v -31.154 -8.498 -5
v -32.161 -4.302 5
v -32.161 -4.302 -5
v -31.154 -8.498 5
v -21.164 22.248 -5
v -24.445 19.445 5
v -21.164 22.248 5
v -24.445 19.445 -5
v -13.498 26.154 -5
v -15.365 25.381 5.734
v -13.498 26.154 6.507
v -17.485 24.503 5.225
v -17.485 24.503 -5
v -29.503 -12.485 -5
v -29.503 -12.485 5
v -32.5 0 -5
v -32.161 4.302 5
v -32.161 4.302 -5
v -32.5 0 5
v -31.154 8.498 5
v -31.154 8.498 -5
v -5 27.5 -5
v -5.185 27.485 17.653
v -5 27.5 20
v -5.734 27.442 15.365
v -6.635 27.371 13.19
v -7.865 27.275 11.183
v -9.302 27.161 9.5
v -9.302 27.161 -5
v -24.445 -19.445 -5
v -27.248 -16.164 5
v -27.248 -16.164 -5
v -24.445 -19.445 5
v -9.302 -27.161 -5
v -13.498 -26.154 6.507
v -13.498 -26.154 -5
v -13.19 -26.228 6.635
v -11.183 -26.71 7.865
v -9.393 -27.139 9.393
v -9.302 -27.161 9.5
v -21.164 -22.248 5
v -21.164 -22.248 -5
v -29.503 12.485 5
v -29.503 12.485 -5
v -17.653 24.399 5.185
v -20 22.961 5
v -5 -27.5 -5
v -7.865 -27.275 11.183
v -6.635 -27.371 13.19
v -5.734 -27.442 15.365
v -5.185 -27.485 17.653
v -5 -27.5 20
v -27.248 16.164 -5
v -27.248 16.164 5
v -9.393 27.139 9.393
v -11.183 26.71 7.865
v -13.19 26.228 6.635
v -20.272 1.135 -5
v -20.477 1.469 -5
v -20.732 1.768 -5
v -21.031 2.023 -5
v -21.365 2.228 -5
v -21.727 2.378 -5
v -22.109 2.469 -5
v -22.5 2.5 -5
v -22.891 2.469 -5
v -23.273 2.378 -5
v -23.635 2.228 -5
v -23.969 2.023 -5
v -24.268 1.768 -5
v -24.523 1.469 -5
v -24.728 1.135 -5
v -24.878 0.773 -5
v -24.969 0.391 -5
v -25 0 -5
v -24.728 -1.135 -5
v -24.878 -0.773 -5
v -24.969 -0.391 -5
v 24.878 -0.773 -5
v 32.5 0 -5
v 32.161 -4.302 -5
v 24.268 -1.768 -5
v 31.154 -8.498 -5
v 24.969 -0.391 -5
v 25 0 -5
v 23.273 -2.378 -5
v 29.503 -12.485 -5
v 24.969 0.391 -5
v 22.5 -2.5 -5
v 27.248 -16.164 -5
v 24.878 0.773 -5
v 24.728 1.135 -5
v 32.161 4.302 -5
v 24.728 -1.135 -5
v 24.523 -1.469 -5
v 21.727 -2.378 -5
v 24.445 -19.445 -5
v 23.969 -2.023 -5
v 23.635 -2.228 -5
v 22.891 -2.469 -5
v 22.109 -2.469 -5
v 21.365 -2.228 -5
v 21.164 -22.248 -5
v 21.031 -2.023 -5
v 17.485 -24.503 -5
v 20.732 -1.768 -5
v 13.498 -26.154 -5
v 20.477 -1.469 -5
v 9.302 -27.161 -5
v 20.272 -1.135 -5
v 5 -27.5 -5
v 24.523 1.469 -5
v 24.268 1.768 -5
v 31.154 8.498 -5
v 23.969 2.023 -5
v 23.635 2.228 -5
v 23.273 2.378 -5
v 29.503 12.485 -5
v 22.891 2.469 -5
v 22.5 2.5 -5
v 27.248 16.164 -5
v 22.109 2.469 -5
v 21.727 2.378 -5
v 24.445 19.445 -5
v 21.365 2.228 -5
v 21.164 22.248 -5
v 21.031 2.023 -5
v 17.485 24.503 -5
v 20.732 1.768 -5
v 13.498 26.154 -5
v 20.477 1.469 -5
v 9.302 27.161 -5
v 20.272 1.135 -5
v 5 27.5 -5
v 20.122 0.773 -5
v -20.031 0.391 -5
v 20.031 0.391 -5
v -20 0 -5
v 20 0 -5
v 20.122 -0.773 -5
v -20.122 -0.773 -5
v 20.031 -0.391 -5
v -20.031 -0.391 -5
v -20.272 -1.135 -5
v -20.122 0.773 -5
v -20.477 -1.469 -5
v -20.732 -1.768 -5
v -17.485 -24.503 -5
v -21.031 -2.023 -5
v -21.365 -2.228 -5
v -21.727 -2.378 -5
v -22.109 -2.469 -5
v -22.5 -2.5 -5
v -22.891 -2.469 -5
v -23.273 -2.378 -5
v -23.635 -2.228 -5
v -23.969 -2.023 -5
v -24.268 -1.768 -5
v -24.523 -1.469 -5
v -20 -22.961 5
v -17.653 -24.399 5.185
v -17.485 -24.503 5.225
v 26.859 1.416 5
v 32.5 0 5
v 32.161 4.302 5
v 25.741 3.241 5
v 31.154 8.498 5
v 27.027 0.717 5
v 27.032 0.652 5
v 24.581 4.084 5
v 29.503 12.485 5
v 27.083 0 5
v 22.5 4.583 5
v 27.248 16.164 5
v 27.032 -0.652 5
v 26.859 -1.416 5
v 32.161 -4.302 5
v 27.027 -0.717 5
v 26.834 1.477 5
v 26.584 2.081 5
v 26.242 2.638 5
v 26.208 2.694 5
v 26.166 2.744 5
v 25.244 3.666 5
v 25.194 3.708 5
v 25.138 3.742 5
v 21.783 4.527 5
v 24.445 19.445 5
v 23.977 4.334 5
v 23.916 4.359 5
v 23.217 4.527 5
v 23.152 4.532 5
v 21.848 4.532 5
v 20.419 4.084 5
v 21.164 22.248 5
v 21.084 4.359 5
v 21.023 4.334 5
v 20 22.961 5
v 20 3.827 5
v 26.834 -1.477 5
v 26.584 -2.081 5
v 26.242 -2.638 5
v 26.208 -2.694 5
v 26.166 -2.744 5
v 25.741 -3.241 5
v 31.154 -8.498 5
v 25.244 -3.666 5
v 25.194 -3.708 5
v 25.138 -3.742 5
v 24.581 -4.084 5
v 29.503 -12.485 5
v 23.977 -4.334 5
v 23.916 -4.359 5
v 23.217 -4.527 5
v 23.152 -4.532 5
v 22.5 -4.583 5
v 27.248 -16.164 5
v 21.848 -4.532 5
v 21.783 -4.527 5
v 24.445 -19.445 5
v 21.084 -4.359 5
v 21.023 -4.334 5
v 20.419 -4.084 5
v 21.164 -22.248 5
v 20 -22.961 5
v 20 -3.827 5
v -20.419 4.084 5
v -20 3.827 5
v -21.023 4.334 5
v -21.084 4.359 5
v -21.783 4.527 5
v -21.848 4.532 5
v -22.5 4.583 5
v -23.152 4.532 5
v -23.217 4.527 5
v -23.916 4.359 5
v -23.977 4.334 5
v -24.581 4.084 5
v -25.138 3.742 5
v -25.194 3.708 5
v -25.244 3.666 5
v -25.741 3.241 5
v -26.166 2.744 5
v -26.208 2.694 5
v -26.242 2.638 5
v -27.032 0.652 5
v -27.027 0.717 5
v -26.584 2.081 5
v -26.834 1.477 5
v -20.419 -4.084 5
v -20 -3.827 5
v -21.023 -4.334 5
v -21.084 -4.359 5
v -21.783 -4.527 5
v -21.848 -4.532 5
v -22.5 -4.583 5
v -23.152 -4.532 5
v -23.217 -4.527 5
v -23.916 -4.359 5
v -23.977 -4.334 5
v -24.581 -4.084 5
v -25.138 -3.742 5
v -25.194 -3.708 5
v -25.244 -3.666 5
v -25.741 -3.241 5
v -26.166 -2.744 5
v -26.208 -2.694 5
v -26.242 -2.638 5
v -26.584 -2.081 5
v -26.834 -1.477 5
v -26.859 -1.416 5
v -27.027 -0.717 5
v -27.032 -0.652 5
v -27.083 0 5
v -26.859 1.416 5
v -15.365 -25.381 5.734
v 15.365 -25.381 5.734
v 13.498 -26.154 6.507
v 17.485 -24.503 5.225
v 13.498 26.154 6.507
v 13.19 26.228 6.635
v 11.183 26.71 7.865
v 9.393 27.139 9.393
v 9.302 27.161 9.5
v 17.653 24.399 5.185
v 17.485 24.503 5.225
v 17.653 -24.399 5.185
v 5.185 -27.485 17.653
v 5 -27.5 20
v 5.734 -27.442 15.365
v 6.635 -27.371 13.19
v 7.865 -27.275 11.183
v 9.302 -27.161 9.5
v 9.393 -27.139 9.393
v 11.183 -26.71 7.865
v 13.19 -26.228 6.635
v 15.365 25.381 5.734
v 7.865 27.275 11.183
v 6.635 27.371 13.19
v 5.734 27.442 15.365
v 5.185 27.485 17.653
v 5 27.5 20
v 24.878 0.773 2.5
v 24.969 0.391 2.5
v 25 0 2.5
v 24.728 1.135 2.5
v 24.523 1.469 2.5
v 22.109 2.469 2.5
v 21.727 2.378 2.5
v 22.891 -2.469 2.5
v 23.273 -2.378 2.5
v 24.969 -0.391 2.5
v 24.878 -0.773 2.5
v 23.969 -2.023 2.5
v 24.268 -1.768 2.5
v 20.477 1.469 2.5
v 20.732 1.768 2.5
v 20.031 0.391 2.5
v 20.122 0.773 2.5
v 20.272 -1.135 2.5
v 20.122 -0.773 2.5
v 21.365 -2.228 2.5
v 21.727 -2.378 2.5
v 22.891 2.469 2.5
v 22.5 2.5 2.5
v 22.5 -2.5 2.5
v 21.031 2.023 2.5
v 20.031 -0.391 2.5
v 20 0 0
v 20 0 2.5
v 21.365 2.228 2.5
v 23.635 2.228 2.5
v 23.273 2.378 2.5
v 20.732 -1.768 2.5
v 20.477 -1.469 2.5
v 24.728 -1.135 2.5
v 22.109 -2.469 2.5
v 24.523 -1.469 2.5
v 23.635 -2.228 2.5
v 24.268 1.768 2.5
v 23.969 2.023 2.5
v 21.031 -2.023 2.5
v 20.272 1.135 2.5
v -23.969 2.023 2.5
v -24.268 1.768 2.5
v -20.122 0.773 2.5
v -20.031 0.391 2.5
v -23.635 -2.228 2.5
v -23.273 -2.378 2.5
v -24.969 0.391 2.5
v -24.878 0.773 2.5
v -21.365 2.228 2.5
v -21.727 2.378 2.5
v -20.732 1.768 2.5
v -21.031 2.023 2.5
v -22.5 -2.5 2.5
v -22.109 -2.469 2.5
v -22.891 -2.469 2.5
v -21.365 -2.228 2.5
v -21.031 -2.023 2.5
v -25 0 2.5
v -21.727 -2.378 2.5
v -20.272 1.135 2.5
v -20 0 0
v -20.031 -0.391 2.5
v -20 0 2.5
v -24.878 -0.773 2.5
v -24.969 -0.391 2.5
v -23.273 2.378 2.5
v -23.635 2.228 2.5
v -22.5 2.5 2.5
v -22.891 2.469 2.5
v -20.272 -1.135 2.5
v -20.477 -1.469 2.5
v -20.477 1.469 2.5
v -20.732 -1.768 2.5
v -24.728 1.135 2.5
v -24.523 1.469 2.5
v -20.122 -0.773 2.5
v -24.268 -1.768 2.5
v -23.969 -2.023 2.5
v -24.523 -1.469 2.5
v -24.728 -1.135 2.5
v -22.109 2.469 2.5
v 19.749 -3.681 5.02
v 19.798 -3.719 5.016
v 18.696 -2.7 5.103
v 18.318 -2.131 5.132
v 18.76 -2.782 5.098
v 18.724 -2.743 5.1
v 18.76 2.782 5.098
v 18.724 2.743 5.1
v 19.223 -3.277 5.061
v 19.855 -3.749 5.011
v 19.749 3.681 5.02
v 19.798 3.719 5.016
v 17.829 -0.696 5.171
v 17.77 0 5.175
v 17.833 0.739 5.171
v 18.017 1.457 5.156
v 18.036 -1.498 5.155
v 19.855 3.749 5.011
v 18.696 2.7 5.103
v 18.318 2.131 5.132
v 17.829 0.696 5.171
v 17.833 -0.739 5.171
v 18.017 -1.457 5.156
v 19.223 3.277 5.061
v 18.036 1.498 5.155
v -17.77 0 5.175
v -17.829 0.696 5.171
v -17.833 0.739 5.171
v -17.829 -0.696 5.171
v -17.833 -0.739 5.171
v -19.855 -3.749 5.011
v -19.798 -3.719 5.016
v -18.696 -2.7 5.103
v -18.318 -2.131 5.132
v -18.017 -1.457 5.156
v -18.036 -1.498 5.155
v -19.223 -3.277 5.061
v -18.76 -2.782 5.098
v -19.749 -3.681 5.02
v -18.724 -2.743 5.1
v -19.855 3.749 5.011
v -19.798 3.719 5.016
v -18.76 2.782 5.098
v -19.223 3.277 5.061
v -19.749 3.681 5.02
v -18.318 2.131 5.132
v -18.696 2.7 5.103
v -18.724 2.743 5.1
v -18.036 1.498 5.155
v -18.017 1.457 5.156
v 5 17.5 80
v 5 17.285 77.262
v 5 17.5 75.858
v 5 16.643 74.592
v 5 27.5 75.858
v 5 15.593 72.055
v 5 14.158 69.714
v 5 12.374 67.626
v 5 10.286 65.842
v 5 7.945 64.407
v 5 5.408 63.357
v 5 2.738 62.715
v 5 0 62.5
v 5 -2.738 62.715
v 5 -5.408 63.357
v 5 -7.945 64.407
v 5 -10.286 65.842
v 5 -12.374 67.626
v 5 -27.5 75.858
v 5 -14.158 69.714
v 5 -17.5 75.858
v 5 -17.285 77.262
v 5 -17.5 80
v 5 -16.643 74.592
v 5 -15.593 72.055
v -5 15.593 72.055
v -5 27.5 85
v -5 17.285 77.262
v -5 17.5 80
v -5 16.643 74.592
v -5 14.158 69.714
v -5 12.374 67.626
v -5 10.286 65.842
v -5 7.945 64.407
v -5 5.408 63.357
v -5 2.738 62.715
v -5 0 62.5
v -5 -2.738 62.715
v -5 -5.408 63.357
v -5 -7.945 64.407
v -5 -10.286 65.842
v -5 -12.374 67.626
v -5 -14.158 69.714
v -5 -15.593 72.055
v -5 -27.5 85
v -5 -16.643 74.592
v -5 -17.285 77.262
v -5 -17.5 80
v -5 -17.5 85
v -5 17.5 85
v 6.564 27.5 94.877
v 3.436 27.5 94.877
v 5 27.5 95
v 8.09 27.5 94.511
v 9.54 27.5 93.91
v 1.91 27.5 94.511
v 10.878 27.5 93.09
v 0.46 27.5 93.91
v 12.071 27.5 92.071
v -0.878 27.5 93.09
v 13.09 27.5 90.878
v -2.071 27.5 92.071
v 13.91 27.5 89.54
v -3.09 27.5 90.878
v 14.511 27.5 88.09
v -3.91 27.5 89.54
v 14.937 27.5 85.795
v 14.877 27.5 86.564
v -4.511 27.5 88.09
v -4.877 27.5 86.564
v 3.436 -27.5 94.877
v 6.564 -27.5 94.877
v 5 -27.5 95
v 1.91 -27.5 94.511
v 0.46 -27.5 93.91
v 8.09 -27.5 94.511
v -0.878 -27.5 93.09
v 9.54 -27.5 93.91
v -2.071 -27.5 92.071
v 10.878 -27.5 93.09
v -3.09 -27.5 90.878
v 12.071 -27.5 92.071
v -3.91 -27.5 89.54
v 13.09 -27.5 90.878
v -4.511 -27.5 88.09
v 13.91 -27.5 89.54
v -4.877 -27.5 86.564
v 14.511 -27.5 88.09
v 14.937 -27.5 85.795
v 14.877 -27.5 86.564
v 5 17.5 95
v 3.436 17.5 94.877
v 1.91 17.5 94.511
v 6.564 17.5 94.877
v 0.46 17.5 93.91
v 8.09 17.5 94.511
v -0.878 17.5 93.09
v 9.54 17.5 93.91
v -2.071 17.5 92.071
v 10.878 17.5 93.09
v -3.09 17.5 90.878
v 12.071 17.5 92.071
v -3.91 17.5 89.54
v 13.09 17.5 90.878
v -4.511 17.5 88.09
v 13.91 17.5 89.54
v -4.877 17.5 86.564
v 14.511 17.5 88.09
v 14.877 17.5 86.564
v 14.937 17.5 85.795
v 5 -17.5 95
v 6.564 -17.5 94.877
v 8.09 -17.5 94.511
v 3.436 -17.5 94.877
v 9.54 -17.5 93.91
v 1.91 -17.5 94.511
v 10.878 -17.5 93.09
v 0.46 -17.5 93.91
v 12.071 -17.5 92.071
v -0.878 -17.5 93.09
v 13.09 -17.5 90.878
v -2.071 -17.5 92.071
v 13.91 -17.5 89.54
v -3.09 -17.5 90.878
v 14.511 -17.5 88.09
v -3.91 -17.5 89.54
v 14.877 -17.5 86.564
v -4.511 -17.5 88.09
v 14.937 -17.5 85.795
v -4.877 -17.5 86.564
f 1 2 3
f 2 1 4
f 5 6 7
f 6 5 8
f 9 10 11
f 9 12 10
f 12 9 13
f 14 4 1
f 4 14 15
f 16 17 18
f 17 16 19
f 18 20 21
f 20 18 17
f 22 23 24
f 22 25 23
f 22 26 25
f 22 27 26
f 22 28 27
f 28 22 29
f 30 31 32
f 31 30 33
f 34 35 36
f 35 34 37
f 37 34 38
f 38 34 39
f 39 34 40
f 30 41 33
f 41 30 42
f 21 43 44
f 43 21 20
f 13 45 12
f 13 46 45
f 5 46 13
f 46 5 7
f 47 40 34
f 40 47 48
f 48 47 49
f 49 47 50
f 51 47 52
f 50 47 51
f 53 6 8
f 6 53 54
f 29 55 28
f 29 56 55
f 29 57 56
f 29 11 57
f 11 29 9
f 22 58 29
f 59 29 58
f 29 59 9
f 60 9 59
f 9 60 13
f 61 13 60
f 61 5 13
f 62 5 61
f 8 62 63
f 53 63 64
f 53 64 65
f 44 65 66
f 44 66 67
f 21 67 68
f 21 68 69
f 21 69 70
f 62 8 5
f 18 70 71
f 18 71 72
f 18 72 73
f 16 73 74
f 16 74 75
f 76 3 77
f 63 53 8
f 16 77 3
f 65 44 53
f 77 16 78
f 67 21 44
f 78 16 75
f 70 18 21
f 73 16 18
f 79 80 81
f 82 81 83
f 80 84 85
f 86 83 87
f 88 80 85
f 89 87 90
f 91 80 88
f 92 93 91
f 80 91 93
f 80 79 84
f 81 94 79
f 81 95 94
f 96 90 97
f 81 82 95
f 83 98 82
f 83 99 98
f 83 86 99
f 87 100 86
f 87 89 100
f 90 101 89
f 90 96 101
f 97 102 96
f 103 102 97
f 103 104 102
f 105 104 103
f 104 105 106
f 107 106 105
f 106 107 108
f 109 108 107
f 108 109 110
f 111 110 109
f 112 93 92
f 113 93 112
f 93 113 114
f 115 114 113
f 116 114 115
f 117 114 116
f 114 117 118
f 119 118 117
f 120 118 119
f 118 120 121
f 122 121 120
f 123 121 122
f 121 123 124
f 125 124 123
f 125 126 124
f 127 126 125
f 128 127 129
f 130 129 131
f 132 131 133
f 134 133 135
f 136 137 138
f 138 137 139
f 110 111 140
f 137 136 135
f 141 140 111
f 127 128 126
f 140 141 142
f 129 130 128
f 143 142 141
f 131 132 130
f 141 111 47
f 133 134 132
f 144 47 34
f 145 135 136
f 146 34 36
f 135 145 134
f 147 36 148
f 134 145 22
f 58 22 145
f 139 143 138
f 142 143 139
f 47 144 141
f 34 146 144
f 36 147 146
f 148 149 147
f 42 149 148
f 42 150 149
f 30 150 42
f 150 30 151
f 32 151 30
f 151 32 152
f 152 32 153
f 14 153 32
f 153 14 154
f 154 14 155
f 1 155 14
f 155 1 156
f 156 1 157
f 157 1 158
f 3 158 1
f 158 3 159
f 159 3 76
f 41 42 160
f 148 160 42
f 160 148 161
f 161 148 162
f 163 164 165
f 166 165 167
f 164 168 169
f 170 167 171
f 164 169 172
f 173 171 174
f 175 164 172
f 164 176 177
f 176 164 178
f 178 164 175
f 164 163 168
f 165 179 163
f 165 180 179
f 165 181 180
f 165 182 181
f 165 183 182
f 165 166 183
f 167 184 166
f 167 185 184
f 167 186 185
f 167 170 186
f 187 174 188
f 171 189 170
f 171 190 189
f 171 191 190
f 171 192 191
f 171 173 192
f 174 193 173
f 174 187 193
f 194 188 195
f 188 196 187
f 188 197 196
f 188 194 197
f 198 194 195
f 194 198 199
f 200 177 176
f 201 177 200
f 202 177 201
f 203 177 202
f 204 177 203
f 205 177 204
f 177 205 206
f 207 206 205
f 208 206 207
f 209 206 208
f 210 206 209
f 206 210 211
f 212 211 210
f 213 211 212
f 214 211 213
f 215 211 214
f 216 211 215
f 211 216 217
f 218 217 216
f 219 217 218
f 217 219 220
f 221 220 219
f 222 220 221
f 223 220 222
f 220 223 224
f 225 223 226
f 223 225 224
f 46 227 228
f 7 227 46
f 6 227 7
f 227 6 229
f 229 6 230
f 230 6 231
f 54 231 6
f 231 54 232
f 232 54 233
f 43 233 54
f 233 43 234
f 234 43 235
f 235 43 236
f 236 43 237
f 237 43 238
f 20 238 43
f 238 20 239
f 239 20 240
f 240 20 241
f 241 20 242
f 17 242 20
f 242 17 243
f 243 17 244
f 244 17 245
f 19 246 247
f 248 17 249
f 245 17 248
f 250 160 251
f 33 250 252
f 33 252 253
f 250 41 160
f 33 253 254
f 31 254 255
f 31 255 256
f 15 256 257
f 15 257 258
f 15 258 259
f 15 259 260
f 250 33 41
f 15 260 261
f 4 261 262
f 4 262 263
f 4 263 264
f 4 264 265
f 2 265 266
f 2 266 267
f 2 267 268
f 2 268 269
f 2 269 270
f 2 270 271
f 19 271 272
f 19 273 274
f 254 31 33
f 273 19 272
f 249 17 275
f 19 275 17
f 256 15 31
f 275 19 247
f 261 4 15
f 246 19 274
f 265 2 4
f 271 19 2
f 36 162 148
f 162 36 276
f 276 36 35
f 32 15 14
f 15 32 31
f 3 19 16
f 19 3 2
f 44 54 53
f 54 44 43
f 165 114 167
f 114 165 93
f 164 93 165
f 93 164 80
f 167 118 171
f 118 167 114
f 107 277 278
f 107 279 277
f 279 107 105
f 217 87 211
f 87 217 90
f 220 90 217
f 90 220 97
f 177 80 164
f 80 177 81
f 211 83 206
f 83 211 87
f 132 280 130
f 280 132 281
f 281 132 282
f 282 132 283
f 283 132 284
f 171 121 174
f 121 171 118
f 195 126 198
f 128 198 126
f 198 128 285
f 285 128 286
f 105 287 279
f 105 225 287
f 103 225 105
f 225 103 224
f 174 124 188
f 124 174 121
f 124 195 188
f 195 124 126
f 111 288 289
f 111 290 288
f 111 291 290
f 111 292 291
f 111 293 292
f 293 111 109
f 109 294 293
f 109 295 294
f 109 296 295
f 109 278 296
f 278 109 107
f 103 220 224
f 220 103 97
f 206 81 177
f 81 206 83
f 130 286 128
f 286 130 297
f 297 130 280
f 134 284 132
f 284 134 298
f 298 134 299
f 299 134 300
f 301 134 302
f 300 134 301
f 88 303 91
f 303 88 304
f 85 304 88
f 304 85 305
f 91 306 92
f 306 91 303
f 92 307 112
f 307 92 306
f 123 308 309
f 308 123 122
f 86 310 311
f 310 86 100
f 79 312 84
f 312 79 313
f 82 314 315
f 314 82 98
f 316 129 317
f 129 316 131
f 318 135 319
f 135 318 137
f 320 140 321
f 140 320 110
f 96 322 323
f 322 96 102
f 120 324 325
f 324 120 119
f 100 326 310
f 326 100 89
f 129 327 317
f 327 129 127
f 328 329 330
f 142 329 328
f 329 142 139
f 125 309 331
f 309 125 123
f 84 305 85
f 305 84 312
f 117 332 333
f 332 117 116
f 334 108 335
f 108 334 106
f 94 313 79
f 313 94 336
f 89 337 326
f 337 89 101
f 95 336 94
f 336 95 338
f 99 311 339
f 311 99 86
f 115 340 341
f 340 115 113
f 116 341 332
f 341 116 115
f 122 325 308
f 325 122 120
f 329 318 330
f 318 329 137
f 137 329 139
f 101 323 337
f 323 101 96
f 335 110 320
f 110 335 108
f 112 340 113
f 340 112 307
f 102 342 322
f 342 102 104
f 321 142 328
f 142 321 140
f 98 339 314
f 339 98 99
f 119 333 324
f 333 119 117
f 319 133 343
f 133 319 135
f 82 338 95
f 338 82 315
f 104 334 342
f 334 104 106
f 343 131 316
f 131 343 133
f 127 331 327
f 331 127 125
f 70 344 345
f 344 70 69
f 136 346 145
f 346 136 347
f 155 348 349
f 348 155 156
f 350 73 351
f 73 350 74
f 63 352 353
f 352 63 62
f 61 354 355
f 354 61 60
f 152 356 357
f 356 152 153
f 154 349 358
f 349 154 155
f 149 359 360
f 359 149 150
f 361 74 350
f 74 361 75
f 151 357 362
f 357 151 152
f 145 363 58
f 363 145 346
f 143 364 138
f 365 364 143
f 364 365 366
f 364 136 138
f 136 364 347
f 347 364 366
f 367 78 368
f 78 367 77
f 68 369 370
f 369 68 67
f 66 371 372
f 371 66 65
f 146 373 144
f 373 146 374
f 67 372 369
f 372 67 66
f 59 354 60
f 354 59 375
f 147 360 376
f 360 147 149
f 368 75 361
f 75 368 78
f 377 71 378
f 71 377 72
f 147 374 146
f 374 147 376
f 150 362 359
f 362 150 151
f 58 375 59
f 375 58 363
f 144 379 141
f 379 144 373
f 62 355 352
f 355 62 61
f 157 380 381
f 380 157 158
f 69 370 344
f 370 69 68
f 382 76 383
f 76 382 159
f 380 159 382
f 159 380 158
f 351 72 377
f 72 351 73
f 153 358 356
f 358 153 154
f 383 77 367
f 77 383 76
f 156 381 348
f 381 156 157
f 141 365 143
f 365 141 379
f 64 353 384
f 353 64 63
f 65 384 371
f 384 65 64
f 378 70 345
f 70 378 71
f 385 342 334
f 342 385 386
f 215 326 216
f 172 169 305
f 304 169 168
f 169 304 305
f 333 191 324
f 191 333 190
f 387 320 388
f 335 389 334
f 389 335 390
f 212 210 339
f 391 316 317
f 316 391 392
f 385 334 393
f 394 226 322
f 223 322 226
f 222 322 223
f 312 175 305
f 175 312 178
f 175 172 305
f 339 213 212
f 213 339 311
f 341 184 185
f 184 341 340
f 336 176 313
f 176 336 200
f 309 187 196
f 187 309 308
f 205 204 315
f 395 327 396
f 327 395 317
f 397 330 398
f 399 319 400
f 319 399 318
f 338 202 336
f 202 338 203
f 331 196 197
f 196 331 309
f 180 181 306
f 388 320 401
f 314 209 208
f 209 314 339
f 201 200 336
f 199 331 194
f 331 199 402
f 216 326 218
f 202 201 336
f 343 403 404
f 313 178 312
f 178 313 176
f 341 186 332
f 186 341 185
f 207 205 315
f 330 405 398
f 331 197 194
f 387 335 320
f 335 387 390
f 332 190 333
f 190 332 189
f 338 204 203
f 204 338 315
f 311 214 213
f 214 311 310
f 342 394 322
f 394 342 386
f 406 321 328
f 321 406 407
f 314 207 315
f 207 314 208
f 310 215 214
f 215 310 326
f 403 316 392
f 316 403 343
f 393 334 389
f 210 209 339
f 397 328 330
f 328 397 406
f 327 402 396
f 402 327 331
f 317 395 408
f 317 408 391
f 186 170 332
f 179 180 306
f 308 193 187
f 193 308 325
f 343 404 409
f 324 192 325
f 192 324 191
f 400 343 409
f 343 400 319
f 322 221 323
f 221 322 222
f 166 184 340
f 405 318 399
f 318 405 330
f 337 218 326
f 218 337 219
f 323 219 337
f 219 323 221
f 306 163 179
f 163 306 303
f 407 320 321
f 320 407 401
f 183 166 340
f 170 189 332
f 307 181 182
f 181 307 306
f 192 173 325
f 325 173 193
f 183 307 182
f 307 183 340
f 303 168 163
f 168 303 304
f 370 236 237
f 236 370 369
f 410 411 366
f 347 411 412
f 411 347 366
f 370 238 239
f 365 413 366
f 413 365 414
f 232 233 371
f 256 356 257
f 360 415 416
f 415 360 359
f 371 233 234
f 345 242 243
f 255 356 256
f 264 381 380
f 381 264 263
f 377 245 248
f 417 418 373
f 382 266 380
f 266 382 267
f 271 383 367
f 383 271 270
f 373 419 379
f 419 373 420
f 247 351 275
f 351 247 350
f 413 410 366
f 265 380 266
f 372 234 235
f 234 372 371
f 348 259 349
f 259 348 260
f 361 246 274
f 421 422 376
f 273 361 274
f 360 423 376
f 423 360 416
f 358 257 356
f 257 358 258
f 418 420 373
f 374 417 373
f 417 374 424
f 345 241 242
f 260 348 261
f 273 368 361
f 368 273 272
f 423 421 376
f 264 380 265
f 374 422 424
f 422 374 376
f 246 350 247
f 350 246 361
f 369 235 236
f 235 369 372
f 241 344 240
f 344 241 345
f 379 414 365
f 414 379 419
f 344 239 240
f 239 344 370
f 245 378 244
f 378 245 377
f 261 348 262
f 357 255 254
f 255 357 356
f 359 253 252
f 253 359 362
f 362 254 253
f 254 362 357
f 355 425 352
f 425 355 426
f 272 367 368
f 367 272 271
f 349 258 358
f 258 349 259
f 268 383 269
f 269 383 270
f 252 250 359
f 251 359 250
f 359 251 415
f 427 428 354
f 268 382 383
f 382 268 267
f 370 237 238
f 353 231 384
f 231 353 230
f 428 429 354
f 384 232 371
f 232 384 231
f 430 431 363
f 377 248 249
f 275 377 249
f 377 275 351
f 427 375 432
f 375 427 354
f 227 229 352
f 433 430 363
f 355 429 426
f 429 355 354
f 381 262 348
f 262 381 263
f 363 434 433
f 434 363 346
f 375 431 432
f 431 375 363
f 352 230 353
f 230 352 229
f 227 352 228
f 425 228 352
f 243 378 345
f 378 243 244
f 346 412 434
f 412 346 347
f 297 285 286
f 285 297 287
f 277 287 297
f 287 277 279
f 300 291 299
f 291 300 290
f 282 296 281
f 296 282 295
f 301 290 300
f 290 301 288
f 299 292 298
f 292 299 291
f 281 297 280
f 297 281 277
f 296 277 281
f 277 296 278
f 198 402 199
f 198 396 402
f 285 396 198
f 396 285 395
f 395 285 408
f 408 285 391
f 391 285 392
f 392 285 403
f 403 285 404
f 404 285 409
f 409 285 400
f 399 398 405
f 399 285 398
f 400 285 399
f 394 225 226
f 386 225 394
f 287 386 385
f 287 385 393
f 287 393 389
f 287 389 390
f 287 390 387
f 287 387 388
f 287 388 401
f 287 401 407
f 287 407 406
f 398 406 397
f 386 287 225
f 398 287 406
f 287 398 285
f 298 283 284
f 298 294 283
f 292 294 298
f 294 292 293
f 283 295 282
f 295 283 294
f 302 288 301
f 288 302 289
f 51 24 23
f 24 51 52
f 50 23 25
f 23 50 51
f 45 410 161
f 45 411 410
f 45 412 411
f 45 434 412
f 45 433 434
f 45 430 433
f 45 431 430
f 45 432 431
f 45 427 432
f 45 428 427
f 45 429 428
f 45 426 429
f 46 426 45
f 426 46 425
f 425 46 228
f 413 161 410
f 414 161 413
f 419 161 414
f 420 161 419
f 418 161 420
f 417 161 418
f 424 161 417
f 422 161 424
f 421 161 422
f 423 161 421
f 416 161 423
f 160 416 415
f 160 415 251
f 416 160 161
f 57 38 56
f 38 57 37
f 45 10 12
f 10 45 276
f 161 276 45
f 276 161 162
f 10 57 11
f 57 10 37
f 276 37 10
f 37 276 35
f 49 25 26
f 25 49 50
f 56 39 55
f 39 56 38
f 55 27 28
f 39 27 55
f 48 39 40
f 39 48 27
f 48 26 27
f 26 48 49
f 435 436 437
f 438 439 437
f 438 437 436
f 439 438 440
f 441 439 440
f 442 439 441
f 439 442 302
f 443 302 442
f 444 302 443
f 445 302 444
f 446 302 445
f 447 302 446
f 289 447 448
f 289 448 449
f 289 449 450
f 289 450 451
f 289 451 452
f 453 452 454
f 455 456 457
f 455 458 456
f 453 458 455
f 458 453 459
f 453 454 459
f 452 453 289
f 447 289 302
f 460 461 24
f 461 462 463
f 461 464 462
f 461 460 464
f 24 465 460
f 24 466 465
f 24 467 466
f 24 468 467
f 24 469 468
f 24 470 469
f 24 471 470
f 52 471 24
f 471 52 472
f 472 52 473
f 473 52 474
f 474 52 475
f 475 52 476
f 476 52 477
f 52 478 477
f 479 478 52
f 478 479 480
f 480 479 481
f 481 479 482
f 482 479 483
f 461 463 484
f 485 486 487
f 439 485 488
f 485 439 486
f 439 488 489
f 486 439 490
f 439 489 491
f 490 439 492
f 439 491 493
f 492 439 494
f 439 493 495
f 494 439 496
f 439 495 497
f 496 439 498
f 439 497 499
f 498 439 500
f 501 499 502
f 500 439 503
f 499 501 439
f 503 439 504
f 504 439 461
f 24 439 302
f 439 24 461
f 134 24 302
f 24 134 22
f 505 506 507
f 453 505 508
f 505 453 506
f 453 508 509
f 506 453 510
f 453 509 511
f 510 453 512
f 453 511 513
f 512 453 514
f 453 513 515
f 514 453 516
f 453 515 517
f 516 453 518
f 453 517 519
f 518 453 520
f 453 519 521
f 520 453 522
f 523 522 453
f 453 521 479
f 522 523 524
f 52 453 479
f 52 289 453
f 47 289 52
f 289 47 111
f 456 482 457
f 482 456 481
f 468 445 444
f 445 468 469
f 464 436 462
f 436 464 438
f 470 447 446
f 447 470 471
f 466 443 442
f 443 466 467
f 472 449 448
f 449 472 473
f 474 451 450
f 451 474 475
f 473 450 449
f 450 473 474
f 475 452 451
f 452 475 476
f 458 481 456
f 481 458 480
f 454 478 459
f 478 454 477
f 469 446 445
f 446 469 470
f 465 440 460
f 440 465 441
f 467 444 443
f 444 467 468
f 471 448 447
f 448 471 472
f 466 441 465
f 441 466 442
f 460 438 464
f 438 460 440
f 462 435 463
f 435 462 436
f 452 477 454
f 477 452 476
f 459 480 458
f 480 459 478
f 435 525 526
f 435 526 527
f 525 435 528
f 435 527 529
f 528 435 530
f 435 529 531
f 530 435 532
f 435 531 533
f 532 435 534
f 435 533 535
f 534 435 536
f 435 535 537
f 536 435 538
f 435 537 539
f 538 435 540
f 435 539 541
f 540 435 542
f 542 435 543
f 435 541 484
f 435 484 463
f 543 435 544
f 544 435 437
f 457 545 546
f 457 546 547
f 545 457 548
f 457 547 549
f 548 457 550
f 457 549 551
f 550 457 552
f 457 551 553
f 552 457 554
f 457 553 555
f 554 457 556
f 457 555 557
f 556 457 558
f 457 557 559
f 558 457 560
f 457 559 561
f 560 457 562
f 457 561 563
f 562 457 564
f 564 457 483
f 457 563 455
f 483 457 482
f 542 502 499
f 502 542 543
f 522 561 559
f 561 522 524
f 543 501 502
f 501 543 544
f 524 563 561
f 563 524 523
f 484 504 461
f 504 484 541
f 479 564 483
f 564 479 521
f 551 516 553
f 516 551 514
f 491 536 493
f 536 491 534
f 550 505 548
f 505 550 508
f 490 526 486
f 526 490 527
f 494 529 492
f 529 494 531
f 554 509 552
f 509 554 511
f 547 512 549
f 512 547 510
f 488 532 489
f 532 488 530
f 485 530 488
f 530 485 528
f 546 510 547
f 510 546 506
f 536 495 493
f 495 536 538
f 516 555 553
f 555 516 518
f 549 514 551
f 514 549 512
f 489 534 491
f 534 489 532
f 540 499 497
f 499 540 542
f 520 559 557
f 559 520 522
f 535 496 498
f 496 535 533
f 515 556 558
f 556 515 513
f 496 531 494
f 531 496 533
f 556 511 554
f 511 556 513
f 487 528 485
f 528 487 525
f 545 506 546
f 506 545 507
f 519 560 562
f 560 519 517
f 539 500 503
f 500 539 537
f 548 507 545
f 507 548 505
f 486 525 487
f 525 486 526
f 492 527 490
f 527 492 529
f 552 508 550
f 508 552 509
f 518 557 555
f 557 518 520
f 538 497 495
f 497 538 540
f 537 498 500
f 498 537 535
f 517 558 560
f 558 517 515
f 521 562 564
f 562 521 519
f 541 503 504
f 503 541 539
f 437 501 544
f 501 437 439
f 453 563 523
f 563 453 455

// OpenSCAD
w = 55;
l = 80;
x = 10;

$fn=40;

difference() {
    union() {
        translate([-x/2,0,0]) cylinder(d=w, h=x, center=true);
        translate([x/2,0,0]) cylinder(d=w, h=x, center=true);
    }
    //translate([x-w/2,0,0]) cylinder(d=3,h=x+2,center=true);
    
    translate([w/2-x/2,0,0]) cylinder(d=5,h=x+2,center=true);
    translate([x/2-w/2,0,0]) cylinder(d=5,h=x+2,center=true);
    translate([w/2-x/2,0,x/2-1]) cylinder(d1=5,d2=10,h=3,center=true);
    translate([x/2-w/2,0,x/2-1]) cylinder(d1=5,d2=10,h=3,center=true);
}

difference() {
    intersection() {
        translate([0,0,x/2]) cube([x*4,w,x*4],center=true);
        union() {
            translate([-x/2,0,x]) cylinder(d=w, h=x*2, center=true);
            translate([x/2,0,x]) cylinder(d=w, h=x*2, center=true);
        }        
    }
    translate([x*2,0,x*2]) rotate([90,0,0]) cylinder(h=w+2,d=3*x,center=true);
    translate([-x*2,0,x*2]) rotate([90,0,0]) cylinder(h=w+2,d=3*x,center=true);
    translate([w/2-x/2,0,x/2-1]) cylinder(d1=5,d2=10,h=3,center=true);
    translate([x/2-w/2,0,x/2-1]) cylinder(d1=5,d2=10,h=3,center=true);
}

difference() {
    translate([0,0,l/2]) cube([x,w,l+x], center=true);    
    translate([0,0,l]) rotate([0,90,0]) cylinder(d=w-x-x,h=x+2,center=true);
    translate([0,0,l+w/2]) cube([x+2,w-x-x,w],center=true);
}

difference() {
    intersection() {
        translate([x/2,0,l+x/2]) rotate([90,0,0]) cylinder(d=2*x,h=w,center=true);
        translate([0,0,l+x/2]) rotate([0,45,0]) cube([x*2,w,x*4],center=true);
    }
    
    translate([0,0,l+x]) cube([x*3,w-x-x,x*3],center=true);
}
